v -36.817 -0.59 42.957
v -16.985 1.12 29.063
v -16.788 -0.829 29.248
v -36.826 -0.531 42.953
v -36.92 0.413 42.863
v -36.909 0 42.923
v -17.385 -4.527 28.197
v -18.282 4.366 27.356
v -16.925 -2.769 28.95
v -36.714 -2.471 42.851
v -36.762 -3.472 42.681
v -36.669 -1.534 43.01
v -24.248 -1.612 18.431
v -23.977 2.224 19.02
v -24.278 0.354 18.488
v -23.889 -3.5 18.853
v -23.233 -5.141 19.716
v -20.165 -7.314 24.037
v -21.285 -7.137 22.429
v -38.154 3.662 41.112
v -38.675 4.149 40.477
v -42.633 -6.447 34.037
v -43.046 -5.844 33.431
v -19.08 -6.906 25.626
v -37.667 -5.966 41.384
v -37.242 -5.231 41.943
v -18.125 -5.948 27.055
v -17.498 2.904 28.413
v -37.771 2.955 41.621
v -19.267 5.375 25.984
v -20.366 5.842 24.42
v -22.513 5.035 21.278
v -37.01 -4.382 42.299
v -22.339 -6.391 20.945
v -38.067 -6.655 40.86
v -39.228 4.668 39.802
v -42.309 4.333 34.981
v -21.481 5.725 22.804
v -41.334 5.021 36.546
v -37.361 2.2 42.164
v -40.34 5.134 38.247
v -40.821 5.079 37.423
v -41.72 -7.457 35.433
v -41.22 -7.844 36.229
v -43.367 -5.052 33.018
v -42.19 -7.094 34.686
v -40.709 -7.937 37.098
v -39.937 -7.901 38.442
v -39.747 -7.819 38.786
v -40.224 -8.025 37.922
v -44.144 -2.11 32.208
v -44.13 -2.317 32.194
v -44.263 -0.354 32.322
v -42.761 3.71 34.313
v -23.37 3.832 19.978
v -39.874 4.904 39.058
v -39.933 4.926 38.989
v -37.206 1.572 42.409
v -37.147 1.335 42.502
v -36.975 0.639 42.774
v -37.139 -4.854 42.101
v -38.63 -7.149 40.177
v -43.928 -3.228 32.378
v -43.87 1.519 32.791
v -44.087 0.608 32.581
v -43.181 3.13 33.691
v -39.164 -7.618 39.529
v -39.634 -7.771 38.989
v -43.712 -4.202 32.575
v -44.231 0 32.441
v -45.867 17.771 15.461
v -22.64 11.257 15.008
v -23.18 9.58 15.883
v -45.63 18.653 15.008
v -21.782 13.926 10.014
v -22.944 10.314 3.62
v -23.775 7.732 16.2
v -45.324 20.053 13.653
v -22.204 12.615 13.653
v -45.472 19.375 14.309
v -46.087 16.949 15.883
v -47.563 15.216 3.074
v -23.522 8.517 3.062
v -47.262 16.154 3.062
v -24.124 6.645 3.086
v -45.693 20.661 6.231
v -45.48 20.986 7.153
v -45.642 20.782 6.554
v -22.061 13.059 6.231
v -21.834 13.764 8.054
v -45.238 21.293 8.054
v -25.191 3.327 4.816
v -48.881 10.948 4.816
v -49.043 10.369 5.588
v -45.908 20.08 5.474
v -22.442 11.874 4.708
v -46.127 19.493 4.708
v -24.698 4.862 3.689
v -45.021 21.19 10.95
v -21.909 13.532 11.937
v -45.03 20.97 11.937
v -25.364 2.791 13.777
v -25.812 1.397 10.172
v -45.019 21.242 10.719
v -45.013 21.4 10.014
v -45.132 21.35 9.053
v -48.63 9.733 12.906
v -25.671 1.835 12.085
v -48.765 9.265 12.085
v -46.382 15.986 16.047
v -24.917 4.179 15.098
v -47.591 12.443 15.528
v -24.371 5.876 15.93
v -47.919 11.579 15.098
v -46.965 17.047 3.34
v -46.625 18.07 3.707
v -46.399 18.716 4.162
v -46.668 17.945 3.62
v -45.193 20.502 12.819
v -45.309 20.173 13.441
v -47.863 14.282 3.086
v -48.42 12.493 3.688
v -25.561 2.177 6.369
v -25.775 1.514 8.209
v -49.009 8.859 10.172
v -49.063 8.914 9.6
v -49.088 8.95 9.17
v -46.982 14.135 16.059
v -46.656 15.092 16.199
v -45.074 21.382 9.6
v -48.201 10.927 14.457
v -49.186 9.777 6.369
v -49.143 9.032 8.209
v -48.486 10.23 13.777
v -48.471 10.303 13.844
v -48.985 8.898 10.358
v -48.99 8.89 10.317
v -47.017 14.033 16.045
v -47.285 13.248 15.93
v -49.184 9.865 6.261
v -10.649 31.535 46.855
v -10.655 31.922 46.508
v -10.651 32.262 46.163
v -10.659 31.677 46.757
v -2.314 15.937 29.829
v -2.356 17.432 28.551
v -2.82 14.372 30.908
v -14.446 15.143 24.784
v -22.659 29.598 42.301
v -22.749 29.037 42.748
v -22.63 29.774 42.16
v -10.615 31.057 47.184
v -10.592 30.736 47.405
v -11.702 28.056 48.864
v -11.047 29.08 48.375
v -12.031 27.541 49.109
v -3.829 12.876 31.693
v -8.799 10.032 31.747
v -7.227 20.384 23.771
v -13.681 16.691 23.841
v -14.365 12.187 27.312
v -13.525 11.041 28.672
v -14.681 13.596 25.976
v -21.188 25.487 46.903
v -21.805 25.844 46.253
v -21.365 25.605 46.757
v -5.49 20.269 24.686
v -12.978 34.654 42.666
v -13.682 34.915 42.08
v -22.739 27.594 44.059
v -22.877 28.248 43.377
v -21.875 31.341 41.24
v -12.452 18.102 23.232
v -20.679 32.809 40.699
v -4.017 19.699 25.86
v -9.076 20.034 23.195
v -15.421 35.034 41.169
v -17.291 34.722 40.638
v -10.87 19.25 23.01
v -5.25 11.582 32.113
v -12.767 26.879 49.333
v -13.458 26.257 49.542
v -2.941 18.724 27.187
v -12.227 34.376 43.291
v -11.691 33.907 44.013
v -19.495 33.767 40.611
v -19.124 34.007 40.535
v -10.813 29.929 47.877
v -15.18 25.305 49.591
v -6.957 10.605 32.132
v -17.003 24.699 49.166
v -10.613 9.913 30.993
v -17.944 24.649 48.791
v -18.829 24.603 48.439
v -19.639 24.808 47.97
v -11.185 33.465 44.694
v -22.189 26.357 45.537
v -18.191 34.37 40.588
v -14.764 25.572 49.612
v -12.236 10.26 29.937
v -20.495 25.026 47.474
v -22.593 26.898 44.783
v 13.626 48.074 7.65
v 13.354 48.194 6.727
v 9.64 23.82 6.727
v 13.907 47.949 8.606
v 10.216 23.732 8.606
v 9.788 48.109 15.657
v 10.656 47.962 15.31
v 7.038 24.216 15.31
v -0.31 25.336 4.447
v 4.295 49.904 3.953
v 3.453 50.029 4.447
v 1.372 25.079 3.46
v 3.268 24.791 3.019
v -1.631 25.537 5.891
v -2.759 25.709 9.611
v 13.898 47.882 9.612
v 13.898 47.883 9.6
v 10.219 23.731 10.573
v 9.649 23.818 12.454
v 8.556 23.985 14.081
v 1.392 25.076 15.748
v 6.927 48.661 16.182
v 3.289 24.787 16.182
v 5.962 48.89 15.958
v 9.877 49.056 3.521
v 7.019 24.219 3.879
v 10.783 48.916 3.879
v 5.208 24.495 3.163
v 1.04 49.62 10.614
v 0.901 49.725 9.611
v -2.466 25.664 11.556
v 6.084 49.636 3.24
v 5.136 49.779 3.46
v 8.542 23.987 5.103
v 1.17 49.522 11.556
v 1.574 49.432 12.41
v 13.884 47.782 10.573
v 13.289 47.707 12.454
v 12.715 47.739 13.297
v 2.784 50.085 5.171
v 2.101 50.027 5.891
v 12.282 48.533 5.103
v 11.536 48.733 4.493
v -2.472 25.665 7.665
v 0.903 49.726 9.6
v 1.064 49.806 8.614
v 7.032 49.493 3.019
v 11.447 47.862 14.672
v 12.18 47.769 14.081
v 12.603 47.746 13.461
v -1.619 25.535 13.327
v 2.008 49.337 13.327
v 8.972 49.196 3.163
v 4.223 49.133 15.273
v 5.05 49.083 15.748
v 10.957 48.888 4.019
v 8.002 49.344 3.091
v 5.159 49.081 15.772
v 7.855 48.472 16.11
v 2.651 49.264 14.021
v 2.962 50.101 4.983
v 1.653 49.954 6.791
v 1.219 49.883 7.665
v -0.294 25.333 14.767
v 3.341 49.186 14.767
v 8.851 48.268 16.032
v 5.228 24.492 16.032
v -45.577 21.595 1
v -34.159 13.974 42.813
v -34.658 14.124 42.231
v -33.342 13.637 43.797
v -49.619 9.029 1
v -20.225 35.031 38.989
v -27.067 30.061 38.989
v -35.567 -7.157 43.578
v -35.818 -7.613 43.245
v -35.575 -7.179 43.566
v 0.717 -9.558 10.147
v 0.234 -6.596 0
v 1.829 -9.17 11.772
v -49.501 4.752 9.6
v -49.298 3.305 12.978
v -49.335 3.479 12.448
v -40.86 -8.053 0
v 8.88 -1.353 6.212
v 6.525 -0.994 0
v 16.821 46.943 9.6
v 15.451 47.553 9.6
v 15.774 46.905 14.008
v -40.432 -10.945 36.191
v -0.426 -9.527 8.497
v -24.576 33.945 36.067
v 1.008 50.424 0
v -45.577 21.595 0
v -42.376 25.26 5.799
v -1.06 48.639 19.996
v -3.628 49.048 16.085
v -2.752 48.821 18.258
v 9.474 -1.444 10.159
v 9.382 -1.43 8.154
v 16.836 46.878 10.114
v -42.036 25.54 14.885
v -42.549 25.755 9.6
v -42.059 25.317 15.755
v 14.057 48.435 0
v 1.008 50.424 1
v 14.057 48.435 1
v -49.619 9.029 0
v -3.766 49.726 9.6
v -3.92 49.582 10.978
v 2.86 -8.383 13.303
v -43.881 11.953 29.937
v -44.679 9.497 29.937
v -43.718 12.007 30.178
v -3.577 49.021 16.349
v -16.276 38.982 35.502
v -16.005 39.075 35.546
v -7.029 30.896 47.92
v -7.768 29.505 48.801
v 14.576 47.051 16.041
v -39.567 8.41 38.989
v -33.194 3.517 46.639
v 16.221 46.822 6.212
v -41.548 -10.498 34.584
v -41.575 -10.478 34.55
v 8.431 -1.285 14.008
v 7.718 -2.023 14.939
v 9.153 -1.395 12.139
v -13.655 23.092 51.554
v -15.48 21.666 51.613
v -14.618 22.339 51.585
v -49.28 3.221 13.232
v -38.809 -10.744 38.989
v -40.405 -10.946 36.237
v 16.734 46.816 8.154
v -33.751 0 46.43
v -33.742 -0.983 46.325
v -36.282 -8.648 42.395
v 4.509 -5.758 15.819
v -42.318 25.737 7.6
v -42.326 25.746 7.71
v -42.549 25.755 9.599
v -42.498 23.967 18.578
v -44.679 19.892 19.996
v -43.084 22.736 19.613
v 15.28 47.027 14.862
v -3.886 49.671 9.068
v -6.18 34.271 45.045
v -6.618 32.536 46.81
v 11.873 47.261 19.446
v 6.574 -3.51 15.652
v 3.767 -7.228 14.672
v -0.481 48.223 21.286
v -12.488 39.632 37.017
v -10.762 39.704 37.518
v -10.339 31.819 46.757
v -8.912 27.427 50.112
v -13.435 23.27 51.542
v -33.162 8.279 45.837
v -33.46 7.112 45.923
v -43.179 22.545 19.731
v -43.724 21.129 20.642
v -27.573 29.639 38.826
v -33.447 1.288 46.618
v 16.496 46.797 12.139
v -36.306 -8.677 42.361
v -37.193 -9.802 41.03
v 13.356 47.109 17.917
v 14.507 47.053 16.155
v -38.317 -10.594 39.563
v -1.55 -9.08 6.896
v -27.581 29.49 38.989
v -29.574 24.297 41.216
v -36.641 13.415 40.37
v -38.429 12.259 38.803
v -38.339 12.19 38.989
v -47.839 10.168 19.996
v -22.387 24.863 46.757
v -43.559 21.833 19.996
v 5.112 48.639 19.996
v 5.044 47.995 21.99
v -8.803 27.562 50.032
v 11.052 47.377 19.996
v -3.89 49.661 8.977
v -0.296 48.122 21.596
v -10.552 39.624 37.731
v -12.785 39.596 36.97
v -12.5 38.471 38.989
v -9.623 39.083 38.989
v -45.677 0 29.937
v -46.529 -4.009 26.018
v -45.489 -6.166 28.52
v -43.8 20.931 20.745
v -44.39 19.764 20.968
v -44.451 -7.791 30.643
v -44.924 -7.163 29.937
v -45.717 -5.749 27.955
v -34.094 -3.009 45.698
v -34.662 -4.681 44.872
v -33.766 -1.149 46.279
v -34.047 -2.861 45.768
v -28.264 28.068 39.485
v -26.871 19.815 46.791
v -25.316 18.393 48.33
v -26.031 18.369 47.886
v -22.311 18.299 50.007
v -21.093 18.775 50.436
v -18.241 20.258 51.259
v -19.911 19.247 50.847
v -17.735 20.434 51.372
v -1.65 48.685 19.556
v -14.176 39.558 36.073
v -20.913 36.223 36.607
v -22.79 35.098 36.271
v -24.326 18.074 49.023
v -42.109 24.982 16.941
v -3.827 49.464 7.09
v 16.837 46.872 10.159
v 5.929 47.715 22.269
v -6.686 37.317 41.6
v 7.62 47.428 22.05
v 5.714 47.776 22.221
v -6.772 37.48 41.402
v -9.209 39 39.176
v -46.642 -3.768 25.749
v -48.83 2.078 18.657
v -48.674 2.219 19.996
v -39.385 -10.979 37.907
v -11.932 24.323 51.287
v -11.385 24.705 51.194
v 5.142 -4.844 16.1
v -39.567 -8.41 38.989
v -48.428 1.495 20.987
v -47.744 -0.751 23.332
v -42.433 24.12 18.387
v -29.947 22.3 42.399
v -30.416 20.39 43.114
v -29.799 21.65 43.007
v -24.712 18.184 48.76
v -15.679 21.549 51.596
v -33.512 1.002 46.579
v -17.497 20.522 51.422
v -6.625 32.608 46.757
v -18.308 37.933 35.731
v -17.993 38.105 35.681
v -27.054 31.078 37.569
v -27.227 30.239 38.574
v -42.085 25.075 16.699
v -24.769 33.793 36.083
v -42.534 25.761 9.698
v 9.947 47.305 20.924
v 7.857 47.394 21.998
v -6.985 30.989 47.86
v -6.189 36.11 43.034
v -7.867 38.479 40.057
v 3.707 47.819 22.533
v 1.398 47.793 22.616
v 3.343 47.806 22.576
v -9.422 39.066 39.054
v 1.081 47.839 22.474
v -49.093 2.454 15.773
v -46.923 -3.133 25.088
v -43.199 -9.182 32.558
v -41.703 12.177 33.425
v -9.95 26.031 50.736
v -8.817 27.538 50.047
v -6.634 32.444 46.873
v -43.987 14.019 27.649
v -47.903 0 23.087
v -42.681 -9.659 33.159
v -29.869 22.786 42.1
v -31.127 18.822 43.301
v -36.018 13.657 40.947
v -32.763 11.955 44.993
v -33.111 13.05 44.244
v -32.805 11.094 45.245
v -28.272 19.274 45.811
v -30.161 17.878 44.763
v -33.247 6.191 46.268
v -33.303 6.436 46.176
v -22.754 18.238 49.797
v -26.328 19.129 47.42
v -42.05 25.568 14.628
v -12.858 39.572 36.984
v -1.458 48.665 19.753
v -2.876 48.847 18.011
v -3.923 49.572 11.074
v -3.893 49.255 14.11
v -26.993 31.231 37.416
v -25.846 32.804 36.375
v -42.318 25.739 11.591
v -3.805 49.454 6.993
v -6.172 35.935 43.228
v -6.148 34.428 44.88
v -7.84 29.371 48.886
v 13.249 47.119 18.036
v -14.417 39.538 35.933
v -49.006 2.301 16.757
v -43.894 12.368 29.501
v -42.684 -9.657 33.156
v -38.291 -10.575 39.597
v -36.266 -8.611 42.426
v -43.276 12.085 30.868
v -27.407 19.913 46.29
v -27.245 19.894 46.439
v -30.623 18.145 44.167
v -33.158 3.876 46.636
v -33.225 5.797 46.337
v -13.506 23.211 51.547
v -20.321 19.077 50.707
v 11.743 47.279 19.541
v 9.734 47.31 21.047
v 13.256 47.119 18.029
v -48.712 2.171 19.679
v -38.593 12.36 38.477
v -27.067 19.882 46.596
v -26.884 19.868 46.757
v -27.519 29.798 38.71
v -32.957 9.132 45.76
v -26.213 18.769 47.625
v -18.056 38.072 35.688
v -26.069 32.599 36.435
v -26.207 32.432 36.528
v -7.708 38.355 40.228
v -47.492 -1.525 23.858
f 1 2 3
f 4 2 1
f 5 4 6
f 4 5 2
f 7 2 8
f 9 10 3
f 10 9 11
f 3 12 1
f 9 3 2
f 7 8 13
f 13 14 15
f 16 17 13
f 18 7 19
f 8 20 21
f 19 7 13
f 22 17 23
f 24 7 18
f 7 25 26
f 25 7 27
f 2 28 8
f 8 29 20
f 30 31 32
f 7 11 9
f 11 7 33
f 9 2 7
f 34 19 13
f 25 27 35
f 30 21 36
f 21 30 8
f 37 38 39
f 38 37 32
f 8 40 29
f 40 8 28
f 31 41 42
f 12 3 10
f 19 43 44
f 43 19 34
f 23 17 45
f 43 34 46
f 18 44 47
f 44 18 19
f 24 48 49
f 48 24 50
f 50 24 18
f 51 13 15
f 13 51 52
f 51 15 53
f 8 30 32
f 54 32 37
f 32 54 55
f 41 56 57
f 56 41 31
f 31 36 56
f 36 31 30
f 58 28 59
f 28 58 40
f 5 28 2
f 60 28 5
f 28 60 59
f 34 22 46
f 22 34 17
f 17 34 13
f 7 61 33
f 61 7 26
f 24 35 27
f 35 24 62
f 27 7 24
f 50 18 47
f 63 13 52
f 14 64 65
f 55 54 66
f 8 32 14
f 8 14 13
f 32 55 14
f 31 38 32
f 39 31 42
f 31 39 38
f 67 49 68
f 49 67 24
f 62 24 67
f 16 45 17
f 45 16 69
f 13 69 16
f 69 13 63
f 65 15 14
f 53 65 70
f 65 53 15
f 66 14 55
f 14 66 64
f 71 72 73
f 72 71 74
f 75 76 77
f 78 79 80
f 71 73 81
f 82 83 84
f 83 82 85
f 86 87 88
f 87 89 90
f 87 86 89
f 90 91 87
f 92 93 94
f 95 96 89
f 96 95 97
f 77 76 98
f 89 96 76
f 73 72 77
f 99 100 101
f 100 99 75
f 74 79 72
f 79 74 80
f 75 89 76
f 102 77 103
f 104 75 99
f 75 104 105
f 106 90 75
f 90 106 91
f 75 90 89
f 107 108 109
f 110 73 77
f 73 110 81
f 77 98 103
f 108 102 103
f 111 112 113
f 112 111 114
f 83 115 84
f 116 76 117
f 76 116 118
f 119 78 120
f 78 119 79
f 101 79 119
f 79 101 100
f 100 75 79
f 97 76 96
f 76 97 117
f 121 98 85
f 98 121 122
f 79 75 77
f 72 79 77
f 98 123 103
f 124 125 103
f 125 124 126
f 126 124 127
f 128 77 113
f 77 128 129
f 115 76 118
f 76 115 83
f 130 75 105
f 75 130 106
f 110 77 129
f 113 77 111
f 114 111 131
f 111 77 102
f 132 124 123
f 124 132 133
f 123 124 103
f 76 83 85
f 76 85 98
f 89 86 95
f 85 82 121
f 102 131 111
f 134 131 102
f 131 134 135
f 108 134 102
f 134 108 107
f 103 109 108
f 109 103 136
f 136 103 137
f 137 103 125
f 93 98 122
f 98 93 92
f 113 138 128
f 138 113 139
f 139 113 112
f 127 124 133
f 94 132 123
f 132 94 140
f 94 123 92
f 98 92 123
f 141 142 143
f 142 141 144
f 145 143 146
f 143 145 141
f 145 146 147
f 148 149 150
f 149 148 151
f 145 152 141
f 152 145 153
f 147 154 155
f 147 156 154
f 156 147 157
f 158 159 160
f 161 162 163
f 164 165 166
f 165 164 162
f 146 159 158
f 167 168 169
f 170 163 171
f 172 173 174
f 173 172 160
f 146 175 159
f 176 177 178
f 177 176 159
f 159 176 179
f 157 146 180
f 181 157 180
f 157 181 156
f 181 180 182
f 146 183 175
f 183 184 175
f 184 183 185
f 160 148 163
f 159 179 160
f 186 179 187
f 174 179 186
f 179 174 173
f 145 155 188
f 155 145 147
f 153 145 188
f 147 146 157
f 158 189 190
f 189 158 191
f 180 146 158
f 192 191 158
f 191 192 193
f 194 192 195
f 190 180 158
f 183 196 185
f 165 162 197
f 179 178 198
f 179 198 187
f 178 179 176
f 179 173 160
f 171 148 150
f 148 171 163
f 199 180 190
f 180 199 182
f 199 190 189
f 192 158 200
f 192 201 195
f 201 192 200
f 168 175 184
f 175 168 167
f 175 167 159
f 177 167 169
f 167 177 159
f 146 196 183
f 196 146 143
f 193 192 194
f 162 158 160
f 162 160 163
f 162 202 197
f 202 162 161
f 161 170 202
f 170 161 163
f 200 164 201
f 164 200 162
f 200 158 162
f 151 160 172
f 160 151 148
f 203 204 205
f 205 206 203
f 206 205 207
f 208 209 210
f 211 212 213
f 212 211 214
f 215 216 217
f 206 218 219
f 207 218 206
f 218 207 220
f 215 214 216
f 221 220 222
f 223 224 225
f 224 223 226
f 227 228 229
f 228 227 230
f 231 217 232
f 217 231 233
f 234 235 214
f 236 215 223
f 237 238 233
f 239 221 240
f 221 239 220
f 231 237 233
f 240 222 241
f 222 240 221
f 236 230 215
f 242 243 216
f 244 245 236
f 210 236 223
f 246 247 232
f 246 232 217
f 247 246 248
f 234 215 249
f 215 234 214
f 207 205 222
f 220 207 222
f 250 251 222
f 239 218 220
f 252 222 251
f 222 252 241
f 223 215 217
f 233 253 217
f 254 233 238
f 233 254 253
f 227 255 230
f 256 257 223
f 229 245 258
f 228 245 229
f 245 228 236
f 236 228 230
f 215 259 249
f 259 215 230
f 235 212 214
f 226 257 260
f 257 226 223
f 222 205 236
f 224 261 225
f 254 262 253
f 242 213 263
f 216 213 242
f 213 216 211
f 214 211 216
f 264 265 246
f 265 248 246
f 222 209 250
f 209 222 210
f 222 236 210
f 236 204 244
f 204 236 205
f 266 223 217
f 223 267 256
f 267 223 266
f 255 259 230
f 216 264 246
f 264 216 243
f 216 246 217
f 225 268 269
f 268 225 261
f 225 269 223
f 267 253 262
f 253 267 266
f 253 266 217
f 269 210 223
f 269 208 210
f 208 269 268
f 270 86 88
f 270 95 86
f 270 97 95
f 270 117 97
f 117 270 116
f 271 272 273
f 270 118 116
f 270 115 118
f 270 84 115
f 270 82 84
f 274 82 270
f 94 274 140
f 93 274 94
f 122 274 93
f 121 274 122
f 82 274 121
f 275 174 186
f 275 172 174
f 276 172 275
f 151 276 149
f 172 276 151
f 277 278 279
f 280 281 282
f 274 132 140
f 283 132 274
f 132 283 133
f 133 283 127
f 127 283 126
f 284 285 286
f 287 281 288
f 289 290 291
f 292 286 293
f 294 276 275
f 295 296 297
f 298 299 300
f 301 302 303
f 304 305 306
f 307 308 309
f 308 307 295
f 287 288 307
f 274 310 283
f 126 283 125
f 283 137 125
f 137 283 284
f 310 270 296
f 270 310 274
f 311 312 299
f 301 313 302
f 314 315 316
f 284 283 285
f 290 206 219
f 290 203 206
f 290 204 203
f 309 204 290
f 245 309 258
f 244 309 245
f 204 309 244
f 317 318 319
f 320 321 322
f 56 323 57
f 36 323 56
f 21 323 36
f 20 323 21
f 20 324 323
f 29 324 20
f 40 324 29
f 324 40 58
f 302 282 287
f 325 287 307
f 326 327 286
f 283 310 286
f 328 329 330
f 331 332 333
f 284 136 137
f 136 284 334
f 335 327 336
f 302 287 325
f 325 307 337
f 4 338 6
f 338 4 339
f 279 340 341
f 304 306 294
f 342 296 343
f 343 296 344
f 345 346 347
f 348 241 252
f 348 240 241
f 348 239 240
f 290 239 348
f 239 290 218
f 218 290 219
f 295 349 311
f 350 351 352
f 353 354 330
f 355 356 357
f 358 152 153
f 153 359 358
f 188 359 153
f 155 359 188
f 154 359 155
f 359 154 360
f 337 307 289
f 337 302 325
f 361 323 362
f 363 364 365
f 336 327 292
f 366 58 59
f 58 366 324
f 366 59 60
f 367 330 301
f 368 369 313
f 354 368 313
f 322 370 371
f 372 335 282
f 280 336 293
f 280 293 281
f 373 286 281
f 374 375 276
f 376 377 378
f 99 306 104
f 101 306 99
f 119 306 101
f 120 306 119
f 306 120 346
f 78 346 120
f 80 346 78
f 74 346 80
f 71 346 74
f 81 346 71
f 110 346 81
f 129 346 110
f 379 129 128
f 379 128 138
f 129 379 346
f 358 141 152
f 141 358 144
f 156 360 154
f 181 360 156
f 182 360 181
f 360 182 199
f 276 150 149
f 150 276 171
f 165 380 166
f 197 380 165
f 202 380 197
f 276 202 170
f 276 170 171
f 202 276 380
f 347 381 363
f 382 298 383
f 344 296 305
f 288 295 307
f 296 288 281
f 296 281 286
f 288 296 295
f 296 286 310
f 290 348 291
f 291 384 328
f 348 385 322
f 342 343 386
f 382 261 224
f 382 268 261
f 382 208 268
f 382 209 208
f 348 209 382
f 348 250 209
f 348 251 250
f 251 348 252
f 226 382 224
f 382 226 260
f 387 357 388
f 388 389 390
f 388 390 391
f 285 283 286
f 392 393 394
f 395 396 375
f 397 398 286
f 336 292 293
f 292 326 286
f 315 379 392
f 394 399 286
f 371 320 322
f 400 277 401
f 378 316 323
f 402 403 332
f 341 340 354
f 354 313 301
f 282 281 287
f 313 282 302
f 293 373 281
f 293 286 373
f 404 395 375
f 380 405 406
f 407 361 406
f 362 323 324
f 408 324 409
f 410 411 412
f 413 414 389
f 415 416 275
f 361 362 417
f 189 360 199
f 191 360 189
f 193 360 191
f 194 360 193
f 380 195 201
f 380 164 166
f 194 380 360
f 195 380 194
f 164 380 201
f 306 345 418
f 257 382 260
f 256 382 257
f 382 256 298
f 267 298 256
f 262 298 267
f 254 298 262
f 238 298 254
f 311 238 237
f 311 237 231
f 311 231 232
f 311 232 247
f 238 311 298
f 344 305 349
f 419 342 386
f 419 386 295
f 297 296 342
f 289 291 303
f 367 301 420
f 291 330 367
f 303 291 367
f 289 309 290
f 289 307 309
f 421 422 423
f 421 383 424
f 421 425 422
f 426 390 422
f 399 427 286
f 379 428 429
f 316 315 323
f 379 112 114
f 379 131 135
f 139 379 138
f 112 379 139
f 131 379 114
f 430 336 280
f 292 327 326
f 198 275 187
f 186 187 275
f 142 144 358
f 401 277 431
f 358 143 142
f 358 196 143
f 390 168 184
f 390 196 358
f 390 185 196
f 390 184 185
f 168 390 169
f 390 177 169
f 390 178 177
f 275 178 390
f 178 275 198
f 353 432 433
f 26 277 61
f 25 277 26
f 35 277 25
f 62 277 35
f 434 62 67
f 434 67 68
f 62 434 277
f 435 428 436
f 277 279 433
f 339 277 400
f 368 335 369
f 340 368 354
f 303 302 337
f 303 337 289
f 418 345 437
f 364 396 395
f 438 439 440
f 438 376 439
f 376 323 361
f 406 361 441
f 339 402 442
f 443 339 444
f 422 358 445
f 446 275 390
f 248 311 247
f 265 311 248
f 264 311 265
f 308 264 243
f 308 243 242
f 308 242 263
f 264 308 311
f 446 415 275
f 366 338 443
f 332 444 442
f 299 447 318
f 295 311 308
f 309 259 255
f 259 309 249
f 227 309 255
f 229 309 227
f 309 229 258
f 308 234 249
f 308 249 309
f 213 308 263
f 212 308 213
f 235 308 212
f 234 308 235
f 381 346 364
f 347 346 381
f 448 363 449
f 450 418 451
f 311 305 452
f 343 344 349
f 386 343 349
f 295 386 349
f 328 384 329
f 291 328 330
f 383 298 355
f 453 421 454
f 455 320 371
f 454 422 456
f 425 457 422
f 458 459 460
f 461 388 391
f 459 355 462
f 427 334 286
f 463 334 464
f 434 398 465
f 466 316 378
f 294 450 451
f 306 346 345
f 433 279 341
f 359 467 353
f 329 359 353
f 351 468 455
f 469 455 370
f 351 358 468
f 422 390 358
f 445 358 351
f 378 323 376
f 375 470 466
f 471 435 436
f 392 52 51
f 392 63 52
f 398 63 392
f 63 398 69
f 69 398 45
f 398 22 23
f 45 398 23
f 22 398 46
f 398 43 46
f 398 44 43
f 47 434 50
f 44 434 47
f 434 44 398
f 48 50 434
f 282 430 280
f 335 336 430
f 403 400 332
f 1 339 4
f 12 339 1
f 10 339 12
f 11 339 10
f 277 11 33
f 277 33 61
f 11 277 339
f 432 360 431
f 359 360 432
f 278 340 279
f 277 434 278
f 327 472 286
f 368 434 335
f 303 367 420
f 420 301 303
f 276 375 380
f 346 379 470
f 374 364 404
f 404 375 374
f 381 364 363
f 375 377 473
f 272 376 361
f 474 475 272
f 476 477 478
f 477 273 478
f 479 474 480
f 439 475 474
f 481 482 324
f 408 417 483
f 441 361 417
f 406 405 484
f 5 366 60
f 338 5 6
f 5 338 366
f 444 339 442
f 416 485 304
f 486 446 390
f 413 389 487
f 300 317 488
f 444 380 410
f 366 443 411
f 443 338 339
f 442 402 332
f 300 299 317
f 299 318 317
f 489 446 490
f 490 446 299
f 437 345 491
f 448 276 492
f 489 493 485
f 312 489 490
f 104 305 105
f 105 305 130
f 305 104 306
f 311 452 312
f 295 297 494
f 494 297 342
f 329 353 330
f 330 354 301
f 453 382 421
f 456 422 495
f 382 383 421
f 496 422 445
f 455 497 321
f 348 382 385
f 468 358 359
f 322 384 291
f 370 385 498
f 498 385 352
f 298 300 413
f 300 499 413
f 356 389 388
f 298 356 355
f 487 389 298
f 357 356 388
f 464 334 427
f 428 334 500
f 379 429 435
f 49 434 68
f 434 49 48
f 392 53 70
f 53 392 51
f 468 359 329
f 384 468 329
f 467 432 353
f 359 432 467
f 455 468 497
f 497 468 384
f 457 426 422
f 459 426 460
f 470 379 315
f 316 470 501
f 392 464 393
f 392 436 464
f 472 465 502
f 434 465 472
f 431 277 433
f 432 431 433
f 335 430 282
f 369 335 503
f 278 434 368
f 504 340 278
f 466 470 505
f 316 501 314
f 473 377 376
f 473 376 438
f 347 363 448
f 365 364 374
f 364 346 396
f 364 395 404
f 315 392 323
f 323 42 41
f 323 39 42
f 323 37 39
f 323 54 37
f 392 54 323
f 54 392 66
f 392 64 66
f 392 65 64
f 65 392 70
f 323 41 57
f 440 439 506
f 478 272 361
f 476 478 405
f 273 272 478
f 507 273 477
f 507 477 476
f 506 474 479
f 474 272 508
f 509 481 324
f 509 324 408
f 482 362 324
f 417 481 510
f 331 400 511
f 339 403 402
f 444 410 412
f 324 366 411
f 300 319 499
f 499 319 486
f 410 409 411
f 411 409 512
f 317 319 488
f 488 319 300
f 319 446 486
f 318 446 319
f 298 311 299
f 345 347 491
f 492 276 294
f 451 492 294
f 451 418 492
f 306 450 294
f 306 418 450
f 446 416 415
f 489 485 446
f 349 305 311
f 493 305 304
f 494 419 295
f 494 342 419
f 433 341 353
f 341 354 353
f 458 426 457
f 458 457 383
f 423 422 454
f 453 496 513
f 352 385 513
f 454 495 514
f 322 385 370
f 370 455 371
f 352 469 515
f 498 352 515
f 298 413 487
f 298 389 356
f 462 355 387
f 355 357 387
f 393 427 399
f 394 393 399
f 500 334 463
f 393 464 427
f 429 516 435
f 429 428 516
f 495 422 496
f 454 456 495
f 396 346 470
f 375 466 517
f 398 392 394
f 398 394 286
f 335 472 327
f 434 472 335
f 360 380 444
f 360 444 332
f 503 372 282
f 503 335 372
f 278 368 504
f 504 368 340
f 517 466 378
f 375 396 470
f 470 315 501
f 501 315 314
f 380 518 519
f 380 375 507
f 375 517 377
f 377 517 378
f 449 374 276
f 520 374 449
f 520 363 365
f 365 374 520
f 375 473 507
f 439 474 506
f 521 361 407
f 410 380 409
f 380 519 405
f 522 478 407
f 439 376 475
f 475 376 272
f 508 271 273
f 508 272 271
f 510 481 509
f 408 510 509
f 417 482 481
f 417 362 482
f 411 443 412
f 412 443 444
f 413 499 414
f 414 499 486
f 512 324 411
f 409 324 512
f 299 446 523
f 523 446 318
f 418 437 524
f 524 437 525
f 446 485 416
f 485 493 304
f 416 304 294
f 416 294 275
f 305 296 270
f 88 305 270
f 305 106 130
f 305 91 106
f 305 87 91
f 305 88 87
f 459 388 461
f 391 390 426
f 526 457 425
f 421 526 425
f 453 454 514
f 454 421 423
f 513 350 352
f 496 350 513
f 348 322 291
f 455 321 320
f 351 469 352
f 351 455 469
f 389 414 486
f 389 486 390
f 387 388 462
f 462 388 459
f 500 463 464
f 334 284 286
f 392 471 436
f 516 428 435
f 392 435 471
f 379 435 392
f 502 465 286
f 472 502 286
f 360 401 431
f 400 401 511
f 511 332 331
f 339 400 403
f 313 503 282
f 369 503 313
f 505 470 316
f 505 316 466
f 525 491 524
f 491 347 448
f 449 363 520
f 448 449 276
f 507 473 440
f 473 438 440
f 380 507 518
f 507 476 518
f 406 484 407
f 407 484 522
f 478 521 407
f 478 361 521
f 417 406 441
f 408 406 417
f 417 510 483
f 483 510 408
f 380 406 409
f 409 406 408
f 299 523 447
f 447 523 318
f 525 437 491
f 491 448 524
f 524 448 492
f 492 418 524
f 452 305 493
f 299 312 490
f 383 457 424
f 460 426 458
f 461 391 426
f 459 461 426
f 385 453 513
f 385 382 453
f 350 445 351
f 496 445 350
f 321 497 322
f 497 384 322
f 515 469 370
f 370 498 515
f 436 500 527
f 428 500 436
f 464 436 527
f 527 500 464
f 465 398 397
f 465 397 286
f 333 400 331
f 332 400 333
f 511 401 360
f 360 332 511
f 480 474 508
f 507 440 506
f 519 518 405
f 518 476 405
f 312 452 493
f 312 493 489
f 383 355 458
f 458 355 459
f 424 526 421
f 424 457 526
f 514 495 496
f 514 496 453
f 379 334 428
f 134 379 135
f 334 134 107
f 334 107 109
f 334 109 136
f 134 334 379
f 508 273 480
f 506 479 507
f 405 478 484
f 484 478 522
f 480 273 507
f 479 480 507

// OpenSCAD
difference() {
	hull() {
		union() {
			union() {
				rotate(a = -177.9697900330, v = [0, 0, 1]) {
					translate(v = [0, -6.6000000000, 0]) {
						cube(size = [41.1191834343, 13.2000000000, 1]);
					}
				}
				rotate(a = 162.1672668474, v = [0, 0, 1]) {
					translate(v = [0, -6.6000000000, 0]) {
						cube(size = [50.0000000000, 13.2000000000, 1]);
					}
				}
				rotate(a = 119.2199332864, v = [0, 0, 1]) {
					translate(v = [0, -6.6000000000, 0]) {
						cube(size = [34.7157630110, 13.2000000000, 1]);
					}
				}
				rotate(a = 81.3357654118, v = [0, 0, 1]) {
					translate(v = [0, -6.6000000000, 0]) {
						cube(size = [50.0000000000, 13.2000000000, 1]);
					}
				}
			}
			translate(v = [0, 0, 9.6000000000]) {
				intersection() {
					hull() {
						rotate(a = 55.3241842208, v = [0.0291346897, -0.8218680166, 0.0000007927]) {
							cylinder(h = 50, r = 9.6000000000);
						}
						rotate(a = 90.0000406964, v = [-0.3062392078, -0.9519545932, 0.0000012582]) {
							cylinder(h = 50, r = 9.6000000000);
						}
						rotate(a = 43.9726553504, v = [-0.6059645188, -0.3389399626, 0.0000009449]) {
							cylinder(h = 50, r = 9.6000000000);
						}
						rotate(a = 89.9999281995, v = [-0.9885881149, 0.1506437490, 0.0000008379]) {
							cylinder(h = 50, r = 9.6000000000);
						}
					}
					sphere(r = 50);
				}
			}
		}
	}
	translate(v = [0, 0, 9.6000000000]) {
		rotate(a = 55.3241842208, v = [0.0291346897, -0.8218680166, 0.0000007927]) {
			translate(v = [0, 0, 25]) {
				cylinder(h = 50, r = 6.6000000000);
			}
		}
		rotate(a = 90.0000406964, v = [-0.3062392078, -0.9519545932, 0.0000012582]) {
			translate(v = [0, 0, 25]) {
				cylinder(h = 50, r = 6.6000000000);
			}
		}
		rotate(a = 43.9726553504, v = [-0.6059645188, -0.3389399626, 0.0000009449]) {
			translate(v = [0, 0, 25]) {
				cylinder(h = 50, r = 6.6000000000);
			}
		}
		rotate(a = 89.9999281995, v = [-0.9885881149, 0.1506437490, 0.0000008379]) {
			translate(v = [0, 0, 25]) {
				cylinder(h = 50, r = 6.6000000000);
			}
		}
	}
}
